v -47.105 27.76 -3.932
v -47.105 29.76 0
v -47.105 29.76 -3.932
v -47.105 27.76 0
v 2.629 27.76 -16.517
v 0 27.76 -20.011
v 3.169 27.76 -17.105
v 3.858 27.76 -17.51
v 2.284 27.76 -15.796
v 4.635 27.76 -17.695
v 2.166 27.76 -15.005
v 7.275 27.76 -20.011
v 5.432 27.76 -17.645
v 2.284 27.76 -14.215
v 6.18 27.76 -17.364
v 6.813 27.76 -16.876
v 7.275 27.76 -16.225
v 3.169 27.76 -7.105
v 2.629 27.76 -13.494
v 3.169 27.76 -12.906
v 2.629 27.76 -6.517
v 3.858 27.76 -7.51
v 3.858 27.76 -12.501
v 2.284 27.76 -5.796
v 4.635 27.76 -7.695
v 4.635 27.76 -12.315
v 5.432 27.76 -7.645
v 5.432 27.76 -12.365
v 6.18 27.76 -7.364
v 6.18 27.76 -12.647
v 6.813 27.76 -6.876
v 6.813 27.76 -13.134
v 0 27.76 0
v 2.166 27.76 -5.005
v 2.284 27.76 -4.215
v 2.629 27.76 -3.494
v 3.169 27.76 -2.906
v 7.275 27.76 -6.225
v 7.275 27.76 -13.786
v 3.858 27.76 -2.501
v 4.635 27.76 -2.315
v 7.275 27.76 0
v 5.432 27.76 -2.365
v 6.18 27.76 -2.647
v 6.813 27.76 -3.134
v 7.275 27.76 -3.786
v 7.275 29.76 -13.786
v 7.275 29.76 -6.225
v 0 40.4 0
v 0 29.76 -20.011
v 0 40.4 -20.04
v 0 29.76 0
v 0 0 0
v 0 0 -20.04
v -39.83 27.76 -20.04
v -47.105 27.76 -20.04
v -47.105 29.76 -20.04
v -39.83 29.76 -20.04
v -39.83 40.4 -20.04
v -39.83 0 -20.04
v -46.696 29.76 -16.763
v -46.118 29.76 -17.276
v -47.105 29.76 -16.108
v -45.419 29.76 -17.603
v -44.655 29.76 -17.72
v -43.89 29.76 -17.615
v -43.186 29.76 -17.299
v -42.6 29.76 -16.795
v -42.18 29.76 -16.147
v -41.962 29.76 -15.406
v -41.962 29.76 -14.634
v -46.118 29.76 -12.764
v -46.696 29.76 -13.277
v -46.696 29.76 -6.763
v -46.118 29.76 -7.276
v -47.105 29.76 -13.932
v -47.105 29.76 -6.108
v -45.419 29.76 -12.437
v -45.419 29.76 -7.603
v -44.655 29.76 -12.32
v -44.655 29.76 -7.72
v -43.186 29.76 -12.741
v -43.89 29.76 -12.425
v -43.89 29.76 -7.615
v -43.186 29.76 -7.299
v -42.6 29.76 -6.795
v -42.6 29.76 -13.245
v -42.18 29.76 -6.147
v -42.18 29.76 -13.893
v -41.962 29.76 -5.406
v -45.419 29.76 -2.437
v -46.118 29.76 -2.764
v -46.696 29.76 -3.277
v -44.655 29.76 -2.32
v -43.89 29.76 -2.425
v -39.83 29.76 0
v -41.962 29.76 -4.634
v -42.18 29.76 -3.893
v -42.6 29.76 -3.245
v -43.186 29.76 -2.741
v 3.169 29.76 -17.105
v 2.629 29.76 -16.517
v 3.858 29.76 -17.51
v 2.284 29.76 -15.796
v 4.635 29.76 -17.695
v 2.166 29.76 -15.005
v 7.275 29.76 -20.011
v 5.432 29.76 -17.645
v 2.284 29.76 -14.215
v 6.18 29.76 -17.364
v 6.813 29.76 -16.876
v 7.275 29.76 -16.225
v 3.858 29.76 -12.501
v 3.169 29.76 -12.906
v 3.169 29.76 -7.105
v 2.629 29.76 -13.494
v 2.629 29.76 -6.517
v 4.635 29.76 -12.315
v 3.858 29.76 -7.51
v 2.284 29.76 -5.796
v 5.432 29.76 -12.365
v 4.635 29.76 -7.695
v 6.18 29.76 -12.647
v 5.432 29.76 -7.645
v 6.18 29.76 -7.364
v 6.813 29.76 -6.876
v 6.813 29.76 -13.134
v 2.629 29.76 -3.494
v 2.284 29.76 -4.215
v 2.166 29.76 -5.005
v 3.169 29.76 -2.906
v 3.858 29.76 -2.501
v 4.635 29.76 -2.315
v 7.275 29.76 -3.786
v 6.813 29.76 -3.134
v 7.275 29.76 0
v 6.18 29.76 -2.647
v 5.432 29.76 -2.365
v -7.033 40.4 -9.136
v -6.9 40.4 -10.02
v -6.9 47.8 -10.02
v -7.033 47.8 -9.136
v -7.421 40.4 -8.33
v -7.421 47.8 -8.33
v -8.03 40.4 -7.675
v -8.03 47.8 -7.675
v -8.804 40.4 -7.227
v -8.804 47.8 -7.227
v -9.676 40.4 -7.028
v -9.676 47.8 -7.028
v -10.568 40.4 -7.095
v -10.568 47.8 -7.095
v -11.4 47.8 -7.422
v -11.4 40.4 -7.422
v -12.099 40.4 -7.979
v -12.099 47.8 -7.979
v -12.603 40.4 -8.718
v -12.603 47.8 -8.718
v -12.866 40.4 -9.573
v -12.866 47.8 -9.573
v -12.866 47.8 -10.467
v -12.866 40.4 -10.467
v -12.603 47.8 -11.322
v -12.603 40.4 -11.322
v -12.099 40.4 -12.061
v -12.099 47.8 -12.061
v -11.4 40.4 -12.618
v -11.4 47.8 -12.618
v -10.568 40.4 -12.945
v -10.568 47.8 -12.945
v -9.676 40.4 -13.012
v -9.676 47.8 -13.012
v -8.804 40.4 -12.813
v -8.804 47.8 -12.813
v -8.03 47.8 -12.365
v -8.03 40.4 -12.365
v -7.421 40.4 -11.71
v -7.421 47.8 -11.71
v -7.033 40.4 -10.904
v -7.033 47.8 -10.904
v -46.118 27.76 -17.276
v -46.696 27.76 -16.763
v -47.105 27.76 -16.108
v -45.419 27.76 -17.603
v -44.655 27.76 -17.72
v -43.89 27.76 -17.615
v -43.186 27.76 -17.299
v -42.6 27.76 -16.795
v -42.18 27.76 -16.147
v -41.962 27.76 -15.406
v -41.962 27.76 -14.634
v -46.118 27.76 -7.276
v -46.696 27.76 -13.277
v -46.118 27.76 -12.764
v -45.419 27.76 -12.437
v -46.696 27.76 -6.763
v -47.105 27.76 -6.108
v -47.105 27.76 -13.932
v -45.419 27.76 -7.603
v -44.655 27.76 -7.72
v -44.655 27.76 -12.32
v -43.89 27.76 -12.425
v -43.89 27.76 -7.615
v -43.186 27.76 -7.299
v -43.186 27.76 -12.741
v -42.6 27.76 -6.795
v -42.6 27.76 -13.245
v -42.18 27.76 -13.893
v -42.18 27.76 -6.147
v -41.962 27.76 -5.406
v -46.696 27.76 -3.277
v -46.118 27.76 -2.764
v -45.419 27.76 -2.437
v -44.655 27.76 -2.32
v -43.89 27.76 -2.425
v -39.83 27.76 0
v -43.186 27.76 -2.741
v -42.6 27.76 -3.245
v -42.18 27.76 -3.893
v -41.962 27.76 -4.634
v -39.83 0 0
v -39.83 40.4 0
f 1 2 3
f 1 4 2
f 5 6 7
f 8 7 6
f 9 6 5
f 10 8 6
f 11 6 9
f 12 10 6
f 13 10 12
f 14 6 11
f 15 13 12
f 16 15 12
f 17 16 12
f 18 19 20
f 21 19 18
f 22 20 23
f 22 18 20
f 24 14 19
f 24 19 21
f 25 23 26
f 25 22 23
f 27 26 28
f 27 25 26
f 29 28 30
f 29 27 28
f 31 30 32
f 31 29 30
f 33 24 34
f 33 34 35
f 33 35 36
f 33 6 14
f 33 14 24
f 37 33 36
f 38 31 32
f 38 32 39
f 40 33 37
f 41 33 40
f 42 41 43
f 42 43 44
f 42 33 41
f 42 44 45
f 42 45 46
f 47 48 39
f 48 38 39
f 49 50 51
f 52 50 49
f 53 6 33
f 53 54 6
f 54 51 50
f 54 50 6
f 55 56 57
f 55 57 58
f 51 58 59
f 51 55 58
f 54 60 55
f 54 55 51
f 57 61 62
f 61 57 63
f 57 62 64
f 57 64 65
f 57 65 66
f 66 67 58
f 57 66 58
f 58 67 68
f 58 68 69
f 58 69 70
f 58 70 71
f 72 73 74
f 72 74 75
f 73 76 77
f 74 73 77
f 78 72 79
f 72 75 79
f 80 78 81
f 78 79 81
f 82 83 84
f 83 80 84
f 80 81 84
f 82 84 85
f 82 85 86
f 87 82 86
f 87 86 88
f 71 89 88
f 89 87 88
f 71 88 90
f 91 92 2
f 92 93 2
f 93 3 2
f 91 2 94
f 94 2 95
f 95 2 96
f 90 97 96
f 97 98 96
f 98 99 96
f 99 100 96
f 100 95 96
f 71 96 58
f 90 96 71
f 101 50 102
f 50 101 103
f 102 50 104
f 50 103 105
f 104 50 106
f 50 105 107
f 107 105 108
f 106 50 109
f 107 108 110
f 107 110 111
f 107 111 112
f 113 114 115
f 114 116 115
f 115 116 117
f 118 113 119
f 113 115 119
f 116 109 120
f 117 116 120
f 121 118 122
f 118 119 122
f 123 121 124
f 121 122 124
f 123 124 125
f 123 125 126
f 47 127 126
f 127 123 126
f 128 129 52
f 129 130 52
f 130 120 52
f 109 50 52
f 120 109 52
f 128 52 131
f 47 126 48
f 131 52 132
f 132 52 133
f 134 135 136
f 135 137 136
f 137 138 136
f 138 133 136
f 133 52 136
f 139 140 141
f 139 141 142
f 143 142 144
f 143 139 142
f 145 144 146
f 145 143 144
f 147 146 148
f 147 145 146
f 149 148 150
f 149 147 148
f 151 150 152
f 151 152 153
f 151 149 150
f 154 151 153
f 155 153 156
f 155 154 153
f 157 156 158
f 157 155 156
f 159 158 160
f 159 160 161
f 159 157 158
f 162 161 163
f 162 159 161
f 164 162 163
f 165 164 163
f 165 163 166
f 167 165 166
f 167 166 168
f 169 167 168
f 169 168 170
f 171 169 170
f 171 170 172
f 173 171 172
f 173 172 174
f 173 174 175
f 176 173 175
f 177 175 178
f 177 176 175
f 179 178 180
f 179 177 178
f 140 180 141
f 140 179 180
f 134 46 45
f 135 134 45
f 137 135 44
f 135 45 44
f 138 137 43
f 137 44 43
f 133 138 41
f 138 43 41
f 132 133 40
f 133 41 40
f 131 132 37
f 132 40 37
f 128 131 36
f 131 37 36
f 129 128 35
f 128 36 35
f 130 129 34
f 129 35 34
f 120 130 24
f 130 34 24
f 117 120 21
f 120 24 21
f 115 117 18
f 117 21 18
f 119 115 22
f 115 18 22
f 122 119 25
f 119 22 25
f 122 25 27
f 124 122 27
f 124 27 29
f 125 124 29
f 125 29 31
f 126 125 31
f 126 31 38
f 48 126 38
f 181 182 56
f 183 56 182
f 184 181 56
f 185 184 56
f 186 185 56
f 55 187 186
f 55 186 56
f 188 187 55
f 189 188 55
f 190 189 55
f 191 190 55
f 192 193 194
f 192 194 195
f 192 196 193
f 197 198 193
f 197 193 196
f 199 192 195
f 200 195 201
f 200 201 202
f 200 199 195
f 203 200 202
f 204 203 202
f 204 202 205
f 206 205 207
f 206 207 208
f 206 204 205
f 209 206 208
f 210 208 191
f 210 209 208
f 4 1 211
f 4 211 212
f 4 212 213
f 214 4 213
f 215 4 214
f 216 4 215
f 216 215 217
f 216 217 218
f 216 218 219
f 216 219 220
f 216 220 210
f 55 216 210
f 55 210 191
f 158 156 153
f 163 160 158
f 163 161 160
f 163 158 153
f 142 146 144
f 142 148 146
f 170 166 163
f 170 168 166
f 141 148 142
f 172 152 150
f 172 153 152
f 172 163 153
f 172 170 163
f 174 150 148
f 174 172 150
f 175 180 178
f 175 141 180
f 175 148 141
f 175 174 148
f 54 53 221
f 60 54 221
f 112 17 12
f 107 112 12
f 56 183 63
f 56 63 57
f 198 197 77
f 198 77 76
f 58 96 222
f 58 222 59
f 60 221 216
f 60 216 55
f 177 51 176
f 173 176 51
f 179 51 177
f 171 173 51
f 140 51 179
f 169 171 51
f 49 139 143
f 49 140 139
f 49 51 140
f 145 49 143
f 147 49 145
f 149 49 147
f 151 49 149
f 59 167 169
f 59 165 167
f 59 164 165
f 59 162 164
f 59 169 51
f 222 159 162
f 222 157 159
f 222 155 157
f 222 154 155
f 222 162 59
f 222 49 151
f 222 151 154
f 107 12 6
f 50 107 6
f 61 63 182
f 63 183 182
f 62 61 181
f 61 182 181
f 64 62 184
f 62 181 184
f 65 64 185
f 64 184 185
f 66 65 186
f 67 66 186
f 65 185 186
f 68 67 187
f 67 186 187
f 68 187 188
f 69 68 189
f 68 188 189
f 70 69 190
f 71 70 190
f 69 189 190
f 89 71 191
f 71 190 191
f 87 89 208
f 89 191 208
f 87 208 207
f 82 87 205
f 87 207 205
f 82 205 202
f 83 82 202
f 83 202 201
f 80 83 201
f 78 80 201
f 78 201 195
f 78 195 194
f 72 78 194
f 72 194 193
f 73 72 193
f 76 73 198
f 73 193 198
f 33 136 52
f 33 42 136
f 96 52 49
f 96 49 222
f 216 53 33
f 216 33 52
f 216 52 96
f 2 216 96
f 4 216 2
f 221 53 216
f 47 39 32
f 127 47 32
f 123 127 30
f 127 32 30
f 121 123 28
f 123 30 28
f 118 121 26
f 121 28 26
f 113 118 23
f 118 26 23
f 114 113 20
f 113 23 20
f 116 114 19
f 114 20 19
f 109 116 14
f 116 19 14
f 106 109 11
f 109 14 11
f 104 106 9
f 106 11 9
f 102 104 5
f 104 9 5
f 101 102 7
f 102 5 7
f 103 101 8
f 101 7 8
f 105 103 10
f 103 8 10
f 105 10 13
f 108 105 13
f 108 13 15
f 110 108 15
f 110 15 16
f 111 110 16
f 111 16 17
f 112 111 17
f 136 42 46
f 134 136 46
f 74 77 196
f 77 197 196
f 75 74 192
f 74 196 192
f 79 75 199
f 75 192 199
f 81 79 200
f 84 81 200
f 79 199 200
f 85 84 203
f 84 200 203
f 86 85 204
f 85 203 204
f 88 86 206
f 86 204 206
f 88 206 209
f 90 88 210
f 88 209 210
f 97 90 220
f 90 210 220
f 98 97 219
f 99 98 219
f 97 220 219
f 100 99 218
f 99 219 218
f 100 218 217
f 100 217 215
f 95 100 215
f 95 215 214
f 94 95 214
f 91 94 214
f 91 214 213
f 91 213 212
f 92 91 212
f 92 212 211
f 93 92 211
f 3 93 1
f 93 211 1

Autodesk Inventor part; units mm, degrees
ref_plane "YZ Plane" through (0, 0, 0) normal (1, 0, 0) x (0, 1, 0)
ref_plane "XZ Plane" through (0, 0, 0) normal (0, 1, 0) x (-1, 0, 0)
ref_plane "XY Plane" through (0, 0, 0) normal (0, 0, 1) x (1, 0, 0)
sketch "スケッチ1" plane through (0, 0, 0) normal (0, 1, 0) x (-1, 0, 0)
  line L0 (0, 0) -> (39.83, 0)
  line L1 (39.83, 0) -> (39.83, -20.04)
  line L2 (39.83, -20.04) -> (0, -20.04)
  line L3 (0, -20.04) -> (0, 0)
  dimension "d0" = 39.83
  dimension "d1" = 20.04
extrude "押し出し1" add sketch "スケッチ1" along normal blind 40.4
ref_plane "作業平面2" through (0, 27.76, 0) normal (0, -1, 0) x (1, 0, 0)
sketch "スケッチ3" plane through (0, 27.76, 0) normal (0, -1, 0) x (1, 0, 0)
  line L0 (0, 0) -> (7.275, 0)
  line L1 (7.275, 0) -> (7.275, -20.0108)
  line L2 (7.275, -20.0108) -> (0, -20.0108)
  line L3 (0, -20.0108) -> (0, 0)
  line L4 (-39.83, -20.04) -> (-39.83, 0) projected
  line L5 (-39.83, 0) -> (-47.105, 0)
  line L6 (-47.105, 0) -> (-47.105, -20.04)
  line L7 (-47.105, -20.04) -> (-39.83, -20.04)
  line L8 (-39.83, -20.04) -> (-39.83, 0)
  dimension "d5" = 7.275
  dimension "d6" = 20.0108
  dimension "d7" = 7.275
extrude "押し出し2" add sketch "スケッチ3" against normal blind 2
sketch "スケッチ6" plane through (0, 40.4, 0) normal (0, 1, 0) x (1, 0, 0)
  line L0 (0, 0) -> (0, 20.04) projected
  line L1 (0, 0) -> (0, 20.04) projected
  line L2 (-39.83, 20.04) -> (-39.83, 0) projected
  line L3 (-39.83, 10.02) -> (0, 10.02)
  circle A0 centre (-9.9, 10.02) radius 3
  dimension "d11" = 9.9
  dimension "d12" = 6
extrude "押し出し3" add sketch "スケッチ6" along normal blind 7.4
sketch "スケッチ9" plane through (0, 29.76, 0) normal (0, 1, 0) x (1, 0, 0)
  circle A0 centre (-44.6339, 15.02) radius 2.75
  circle A1 centre (-44.6339, 5.02) radius 2.75
  circle A2 centre (4.8661, 15.0054) radius 2.75
  circle A3 centre (4.8661, 5.0054) radius 2.75
  line L0 (-47.105, 0) -> (-47.105, 20.04) projected
  line L1 (-47.105, 10.02) -> (-39.83, 10.02)
  line L2 (-39.83, 20.04) -> (-39.83, 0) projected
  line L3 (-47.105, 20.04) -> (-47.105, 0) projected
  line L4 (-44.6339, 15.02) -> (-44.6339, 5.02)
  line L5 (4.8661, 15.0054) -> (4.8661, 5.0054)
  line L6 (7.275, 20.0108) -> (7.275, 0) projected
  line L7 (7.275, 10.0054) -> (0.184, 10.0054)
  point P0 (0, 0)
  point P1 (-44.6339, 10.02)
  point P2 (4.8661, 10.0054)
  dimension "d15" = 10
  dimension "d16" = 5.5
  dimension "d17" = 5.5
  dimension "d18" = 5.5
  dimension "d19" = 10
  dimension "d20" = 5.5
  dimension "d21" = 49.5
hole "穴1" at (-44.6339, 29.76, -15.02) at (4.8661, 29.76, -15.0054) at (-44.6339, 29.76, -5.02) at (4.8661, 29.76, -5.0054) direction (0, -1, 0) diameter 5.4 end through all
properties part number "sarvo_motor"
